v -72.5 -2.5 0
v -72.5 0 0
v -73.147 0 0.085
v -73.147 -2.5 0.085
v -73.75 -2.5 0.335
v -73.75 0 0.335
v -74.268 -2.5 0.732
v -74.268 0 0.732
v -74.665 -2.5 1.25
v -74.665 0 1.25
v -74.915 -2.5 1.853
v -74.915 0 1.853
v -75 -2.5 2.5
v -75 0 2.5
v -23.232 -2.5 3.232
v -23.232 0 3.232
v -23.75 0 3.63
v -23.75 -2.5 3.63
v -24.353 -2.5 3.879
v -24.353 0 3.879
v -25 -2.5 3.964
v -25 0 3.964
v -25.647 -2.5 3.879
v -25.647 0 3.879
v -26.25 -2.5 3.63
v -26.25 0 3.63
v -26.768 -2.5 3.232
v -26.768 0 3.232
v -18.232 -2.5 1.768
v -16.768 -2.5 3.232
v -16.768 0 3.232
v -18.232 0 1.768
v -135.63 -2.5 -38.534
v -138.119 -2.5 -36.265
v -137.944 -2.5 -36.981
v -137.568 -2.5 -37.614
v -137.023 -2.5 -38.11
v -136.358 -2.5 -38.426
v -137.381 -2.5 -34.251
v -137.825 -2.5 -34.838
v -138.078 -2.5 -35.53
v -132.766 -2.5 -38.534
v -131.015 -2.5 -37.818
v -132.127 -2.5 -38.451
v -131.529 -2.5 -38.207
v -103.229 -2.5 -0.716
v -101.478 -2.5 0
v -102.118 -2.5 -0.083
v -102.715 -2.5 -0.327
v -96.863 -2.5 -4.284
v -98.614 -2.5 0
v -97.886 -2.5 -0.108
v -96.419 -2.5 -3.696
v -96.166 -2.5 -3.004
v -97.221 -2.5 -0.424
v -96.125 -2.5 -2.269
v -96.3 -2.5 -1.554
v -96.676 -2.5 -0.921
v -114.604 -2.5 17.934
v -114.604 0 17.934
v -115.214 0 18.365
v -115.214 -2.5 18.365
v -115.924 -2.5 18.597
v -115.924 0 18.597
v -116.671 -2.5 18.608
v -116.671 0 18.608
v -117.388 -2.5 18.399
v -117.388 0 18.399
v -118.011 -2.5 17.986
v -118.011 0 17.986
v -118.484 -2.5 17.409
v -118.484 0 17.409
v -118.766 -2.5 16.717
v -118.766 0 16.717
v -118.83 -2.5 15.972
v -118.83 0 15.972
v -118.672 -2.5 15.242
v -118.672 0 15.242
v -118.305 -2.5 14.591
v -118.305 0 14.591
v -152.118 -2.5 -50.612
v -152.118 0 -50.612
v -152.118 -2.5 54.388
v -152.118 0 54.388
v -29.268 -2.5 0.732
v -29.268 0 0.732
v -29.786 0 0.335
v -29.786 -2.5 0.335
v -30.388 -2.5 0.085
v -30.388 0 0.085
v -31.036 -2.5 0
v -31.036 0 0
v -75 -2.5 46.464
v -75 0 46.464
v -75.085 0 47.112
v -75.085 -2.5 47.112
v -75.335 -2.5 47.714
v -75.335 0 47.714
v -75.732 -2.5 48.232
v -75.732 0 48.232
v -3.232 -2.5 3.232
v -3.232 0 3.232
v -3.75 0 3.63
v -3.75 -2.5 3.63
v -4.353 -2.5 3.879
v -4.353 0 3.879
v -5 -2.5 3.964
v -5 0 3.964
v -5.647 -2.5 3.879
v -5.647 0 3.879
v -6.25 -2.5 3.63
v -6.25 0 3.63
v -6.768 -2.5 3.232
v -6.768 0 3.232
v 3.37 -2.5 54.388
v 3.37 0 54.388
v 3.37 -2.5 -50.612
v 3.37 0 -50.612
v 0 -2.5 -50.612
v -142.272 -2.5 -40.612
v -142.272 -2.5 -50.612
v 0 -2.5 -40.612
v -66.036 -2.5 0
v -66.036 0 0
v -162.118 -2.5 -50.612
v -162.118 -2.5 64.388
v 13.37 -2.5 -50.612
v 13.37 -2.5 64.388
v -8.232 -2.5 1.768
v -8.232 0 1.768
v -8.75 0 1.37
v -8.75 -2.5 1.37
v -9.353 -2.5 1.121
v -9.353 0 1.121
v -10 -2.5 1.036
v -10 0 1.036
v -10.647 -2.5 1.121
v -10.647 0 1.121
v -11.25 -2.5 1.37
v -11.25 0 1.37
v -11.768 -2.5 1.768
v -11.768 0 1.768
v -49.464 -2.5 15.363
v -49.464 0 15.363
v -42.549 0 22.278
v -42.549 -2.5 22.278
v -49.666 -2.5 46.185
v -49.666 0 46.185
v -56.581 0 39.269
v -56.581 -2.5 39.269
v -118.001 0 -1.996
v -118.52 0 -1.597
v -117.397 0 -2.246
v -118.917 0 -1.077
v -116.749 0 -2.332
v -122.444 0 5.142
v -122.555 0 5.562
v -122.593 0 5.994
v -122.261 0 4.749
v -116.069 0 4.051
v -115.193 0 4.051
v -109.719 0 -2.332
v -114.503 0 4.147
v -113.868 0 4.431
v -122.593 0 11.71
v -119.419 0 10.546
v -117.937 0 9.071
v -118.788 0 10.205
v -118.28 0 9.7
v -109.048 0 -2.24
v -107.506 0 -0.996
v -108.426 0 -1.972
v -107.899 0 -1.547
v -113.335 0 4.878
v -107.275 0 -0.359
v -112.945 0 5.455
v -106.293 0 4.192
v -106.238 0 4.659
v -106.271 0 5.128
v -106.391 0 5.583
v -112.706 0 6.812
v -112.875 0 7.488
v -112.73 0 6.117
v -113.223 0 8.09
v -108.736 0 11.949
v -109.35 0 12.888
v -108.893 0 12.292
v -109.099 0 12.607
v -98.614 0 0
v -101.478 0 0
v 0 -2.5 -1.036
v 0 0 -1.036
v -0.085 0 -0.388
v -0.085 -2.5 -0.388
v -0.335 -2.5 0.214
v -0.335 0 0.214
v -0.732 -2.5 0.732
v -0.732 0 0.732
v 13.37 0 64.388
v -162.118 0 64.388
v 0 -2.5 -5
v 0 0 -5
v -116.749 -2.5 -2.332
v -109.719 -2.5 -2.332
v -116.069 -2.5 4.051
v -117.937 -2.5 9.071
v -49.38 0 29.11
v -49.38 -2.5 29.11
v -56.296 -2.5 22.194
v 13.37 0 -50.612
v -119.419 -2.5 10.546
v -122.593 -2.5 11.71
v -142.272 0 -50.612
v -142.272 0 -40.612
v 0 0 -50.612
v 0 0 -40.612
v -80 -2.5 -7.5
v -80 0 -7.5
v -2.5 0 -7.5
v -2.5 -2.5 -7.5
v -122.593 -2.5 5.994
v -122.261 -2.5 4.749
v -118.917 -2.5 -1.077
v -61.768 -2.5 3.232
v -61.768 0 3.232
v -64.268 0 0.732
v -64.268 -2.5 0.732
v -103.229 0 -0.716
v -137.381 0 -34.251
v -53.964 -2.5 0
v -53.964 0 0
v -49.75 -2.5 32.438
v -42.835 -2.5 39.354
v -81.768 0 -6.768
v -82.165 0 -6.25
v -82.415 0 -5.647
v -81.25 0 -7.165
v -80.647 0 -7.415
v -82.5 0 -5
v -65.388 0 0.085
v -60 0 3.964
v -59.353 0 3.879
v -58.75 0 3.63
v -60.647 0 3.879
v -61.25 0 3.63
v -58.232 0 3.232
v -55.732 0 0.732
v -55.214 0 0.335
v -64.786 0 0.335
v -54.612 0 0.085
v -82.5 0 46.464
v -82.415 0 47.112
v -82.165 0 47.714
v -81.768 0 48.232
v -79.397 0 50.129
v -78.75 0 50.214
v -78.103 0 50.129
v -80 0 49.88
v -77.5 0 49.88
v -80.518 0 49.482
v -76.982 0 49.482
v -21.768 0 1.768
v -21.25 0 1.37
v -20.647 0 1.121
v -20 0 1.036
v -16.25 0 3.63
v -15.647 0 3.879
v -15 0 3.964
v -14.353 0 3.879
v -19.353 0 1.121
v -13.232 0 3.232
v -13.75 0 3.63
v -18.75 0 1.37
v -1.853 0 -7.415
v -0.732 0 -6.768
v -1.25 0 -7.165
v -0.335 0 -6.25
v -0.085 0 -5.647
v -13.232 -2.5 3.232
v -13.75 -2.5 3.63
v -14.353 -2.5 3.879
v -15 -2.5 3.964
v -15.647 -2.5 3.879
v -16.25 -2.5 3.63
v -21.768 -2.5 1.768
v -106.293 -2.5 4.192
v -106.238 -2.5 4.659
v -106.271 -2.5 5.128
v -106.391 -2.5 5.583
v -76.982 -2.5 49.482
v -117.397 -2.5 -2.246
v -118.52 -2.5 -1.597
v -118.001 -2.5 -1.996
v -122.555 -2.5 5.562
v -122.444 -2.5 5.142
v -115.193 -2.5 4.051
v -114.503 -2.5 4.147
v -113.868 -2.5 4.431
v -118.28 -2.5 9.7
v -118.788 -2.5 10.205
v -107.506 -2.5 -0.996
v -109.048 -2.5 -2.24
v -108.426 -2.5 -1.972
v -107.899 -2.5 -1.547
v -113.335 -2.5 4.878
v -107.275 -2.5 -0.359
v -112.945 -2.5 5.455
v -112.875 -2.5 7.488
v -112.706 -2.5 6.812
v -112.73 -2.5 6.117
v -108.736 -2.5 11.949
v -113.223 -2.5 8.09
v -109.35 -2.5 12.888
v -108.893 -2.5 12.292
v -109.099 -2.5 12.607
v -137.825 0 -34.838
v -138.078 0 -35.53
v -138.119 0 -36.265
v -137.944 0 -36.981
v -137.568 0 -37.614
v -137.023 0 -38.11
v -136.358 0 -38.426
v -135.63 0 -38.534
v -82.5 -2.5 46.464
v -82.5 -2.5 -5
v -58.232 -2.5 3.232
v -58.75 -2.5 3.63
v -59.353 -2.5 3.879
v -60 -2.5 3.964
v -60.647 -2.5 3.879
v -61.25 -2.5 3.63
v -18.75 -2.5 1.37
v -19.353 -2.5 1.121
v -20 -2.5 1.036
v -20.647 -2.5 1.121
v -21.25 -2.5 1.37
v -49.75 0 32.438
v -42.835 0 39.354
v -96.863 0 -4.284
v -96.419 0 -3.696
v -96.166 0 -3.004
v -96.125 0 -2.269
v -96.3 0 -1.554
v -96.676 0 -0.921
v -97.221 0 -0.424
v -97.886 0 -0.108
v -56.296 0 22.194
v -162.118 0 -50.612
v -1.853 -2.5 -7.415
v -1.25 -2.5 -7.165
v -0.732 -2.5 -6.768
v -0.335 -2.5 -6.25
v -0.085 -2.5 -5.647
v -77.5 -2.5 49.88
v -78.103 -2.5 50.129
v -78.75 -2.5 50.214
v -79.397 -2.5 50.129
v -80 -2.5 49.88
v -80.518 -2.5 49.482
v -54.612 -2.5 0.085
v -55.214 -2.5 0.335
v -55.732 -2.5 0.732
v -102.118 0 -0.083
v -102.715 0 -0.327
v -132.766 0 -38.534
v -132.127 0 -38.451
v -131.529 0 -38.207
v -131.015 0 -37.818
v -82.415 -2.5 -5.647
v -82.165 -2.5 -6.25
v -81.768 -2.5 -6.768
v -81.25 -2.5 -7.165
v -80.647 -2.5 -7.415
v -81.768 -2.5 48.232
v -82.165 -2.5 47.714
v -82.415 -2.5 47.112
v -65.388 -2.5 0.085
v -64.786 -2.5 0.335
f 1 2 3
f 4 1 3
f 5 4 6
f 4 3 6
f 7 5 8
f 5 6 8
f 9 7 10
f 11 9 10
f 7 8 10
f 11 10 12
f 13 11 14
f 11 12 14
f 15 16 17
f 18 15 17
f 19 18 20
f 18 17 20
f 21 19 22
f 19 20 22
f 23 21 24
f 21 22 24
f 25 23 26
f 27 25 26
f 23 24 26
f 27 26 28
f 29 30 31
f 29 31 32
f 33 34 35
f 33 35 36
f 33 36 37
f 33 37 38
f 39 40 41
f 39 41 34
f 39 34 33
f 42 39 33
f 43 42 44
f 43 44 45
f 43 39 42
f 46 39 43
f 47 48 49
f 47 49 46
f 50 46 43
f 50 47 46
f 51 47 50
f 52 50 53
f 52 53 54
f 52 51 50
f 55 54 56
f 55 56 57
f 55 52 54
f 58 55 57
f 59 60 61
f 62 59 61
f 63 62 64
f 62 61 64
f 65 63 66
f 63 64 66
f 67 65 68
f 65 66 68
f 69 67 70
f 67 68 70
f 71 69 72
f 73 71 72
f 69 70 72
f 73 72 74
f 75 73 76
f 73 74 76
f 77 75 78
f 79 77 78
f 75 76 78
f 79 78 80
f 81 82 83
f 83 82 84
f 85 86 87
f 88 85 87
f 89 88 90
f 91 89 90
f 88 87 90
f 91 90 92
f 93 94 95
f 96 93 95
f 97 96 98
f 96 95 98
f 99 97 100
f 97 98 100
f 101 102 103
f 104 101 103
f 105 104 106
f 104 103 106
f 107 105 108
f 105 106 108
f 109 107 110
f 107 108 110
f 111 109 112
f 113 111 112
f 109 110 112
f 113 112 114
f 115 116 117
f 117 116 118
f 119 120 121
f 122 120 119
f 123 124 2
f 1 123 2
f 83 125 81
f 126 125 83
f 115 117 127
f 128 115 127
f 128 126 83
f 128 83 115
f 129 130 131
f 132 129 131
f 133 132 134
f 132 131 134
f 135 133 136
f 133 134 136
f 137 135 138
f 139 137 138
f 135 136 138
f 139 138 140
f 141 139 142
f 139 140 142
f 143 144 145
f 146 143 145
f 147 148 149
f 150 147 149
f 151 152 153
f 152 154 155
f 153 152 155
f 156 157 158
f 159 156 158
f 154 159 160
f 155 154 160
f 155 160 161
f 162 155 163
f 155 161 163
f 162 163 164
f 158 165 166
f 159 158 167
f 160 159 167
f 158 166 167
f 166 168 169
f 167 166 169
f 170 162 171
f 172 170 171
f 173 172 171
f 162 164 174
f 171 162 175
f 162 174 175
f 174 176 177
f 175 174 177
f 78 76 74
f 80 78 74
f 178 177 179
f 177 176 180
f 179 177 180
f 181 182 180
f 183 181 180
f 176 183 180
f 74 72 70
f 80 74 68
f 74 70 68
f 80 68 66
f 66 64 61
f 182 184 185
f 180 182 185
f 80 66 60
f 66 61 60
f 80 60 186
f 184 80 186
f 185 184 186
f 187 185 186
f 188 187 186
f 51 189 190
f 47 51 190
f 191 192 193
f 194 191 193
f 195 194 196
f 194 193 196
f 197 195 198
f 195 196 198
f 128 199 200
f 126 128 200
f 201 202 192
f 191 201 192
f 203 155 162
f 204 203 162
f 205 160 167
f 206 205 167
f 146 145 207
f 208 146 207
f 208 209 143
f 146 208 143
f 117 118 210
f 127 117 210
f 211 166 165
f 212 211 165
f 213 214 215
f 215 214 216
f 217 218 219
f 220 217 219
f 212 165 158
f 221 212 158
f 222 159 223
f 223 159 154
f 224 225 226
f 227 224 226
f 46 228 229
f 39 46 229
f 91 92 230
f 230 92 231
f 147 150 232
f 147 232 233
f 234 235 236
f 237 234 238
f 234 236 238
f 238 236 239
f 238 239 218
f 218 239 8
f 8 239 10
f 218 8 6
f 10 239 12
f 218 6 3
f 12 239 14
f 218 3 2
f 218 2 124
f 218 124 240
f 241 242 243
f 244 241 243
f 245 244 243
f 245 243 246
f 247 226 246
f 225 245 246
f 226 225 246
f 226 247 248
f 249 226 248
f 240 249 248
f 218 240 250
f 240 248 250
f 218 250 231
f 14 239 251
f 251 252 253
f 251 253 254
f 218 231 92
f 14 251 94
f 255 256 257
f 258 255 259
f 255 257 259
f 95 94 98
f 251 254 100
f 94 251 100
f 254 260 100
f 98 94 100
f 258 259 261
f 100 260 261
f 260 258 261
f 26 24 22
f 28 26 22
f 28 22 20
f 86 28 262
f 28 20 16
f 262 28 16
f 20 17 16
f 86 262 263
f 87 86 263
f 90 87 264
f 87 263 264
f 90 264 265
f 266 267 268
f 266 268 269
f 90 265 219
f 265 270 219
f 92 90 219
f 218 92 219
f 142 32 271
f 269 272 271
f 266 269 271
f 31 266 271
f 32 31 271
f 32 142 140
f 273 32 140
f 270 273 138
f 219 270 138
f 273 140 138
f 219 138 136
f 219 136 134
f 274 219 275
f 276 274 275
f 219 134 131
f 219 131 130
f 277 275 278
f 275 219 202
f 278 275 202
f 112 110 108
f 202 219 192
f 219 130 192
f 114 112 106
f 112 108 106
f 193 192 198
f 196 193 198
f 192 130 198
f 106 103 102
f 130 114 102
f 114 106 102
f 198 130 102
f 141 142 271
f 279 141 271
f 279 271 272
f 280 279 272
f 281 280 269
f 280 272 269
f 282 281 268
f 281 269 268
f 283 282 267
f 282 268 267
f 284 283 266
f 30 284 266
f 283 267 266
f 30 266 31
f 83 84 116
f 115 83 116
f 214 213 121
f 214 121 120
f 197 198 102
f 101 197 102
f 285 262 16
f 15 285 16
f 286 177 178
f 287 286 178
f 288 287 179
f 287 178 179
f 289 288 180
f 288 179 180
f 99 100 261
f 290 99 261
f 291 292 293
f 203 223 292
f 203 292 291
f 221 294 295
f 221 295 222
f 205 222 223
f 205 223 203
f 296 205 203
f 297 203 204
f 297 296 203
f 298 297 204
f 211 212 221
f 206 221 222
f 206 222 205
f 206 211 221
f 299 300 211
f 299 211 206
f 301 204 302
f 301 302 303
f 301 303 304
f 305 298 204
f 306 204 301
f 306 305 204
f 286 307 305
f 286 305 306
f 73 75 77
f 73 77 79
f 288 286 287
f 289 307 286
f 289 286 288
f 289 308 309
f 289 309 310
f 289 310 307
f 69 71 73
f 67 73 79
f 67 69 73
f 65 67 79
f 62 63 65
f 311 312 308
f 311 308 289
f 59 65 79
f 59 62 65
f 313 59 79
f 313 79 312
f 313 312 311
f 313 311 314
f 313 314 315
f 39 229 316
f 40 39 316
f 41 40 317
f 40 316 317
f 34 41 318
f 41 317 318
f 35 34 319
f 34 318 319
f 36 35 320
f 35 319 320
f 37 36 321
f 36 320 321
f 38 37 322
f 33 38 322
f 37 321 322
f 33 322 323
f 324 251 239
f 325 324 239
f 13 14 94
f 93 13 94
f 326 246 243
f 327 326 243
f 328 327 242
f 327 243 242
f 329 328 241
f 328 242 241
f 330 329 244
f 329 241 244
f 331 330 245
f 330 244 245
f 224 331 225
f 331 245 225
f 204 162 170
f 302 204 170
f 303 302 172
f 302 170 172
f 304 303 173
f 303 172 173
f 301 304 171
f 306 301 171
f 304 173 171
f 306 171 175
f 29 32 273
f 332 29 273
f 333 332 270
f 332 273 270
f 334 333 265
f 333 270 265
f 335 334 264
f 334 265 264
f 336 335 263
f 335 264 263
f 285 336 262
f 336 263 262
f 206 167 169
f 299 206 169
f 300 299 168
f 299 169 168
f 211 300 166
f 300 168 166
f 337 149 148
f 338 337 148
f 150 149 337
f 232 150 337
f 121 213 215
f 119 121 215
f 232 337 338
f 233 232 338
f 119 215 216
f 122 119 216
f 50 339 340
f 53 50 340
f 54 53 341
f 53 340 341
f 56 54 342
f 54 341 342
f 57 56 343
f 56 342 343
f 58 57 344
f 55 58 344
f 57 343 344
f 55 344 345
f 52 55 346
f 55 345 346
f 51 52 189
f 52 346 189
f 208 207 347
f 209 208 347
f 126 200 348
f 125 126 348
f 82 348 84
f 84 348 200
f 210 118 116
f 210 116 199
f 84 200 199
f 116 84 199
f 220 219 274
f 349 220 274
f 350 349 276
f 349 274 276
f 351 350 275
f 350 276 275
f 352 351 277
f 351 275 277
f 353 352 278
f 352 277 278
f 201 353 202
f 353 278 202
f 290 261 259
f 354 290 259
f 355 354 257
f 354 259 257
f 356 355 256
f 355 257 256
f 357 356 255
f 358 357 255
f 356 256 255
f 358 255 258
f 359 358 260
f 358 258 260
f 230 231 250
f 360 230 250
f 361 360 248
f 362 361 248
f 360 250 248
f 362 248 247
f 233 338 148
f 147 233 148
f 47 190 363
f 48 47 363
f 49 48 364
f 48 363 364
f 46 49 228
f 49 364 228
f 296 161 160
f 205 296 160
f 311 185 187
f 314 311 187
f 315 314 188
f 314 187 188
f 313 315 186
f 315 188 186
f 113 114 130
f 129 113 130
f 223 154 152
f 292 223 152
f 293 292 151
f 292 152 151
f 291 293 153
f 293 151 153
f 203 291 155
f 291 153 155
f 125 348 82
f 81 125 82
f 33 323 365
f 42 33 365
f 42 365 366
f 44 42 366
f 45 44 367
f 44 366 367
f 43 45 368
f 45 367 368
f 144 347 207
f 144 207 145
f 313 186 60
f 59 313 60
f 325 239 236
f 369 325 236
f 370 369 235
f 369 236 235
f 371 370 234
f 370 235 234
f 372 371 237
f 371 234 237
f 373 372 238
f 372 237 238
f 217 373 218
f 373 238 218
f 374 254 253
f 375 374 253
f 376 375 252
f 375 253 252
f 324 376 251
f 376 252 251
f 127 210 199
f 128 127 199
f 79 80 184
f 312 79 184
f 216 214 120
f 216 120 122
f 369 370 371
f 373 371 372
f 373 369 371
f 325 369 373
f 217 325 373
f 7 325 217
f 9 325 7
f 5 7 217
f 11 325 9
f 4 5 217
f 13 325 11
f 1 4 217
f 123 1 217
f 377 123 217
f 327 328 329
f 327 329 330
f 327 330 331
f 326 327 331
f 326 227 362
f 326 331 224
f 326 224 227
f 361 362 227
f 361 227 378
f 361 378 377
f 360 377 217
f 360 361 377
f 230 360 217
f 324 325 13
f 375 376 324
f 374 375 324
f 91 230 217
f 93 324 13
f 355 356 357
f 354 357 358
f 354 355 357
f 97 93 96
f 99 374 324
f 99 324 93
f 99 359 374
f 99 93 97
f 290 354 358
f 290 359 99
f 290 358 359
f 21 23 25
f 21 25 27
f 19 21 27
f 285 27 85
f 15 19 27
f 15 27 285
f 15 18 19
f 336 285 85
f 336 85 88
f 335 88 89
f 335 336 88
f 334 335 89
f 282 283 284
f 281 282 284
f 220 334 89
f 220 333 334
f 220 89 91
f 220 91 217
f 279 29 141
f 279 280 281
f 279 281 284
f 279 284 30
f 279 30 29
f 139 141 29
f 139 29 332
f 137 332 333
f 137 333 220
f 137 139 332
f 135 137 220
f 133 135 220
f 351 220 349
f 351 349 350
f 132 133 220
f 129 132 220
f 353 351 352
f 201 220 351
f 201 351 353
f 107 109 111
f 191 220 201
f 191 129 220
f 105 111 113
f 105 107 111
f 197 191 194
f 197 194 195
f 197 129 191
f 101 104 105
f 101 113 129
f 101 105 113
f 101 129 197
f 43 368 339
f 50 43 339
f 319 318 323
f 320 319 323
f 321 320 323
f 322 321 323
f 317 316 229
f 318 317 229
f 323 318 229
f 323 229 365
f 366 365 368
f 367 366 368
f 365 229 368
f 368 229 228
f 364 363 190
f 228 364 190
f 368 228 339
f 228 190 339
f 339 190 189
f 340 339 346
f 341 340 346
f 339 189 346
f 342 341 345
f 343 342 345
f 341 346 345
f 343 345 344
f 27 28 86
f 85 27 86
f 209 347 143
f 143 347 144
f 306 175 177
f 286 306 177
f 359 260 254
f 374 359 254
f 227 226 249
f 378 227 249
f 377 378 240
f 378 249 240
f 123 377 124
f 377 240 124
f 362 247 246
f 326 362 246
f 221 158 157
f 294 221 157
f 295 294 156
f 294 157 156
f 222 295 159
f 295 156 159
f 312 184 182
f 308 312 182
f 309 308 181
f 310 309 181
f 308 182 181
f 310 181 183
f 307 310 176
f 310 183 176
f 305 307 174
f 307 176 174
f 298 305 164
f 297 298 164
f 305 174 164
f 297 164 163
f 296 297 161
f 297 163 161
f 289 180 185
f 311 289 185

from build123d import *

# Parameters (mm, degrees)
F1_DEPTH = 5
F0_W     = 310.97637631
F0_H     = 20
F0_W_2   = 284.5448851585
F2_SCALE = 0.5


with BuildPart() as f1:
    # F0 (on Front) → F1 (new body)
    with BuildSketch(Plane.XZ):
        with BuildLine():
            Line((0, -10), (0, -2.0710678119))
            ThreePointArc((0, -2.0710678119), (-0.3806023374, -0.15765065), (-1.4644660941, 1.4644660941))
            Line((-1.4644660941, 1.4644660941), (-6.4644660941, 6.4644660941))
            ThreePointArc((-6.4644660941, 6.4644660941), (-10, 7.9289321881), (-13.5355339059, 6.4644660941))
            Line((-13.5355339059, 6.4644660941), (-16.4644660941, 3.5355339059))
            ThreePointArc((-16.4644660941, 3.5355339059), (-20, 2.0710678119), (-23.5355339059, 3.5355339059))
            Line((-23.5355339059, 3.5355339059), (-26.4644660941, 6.4644660941))
            ThreePointArc((-26.4644660941, 6.4644660941), (-30, 7.9289321881), (-33.5355339059, 6.4644660941))
            Line((-33.5355339059, 6.4644660941), (-36.4644660941, 3.5355339059))
            ThreePointArc((-36.4644660941, 3.5355339059), (-40, 2.0710678119), (-43.5355339059, 3.5355339059))
            Line((-43.5355339059, 3.5355339059), (-46.4644660941, 6.4644660941))
            ThreePointArc((-46.4644660941, 6.4644660941), (-50, 7.9289321881), (-53.5355339059, 6.4644660941))
            Line((-53.5355339059, 6.4644660941), (-58.5355339059, 1.4644660941))
            ThreePointArc((-58.5355339059, 1.4644660941), (-60.15765065, 0.3806023374), (-62.0710678119, 0))
            Line((-62.0710678119, 0), (-107.9289321881, 0))
            ThreePointArc((-107.9289321881, 0), (-109.84234935, 0.3806023374), (-111.4644660941, 1.4644660941))
            Line((-111.4644660941, 1.4644660941), (-116.4644660941, 6.4644660941))
            ThreePointArc((-116.4644660941, 6.4644660941), (-120, 7.9289321881), (-123.5355339059, 6.4644660941))
            Line((-123.5355339059, 6.4644660941), (-128.5355339059, 1.4644660941))
            ThreePointArc((-128.5355339059, 1.4644660941), (-130.15765065, 0.3806023374), (-132.0710678119, 0))
            Line((-132.0710678119, 0), (-145, 0))
            ThreePointArc((-145, 0), (-148.5355339059, 1.4644660941), (-150, 5))
            Line((-150, 5), (-150, 92.9289321881))
            ThreePointArc((-150, 92.9289321881), (-150.3806023374, 94.84234935), (-151.4644660941, 96.4644660941))
            Line((-151.4644660941, 96.4644660941), (-153.9644660941, 98.9644660941))
            ThreePointArc((-153.9644660941, 98.9644660941), (-157.5, 100.4289321881), (-161.0355339059, 98.9644660941))
            Line((-161.0355339059, 98.9644660941), (-163.5355339059, 96.4644660941))
            ThreePointArc((-163.5355339059, 96.4644660941), (-164.6193976626, 94.84234935), (-165, 92.9289321881))
            Line((-165, 92.9289321881), (-165, -10))
            ThreePointArc((-165, -10), (-163.5355339059, -13.5355339059), (-160, -15))
            Line((-160, -15), (-5, -15))
            ThreePointArc((-5, -15), (-1.4644660941, -13.5355339059), (0, -10))
        make_face()
    extrude(amount=F1_DEPTH)


with BuildPart() as f1b:
    # F0 (on Front) → F1, piece 2 (new body)
    with BuildSketch(Plane.XZ):
        with BuildLine():
            ThreePointArc((-193.7254233377, -8.5676432473), (-192.6004753719, -3.1076755348), (-197.2285536036, 0))
            Line((-197.2285536036, 0), (-202.9556044966, 0))
            ThreePointArc((-202.9556044966, 0), (-204.8479289618, -0.3719217683), (-206.4587347625, -1.4323567527))
            Line((-206.4587347625, -1.4323567527), (-274.7627281037, -68.501222602))
            ThreePointArc((-274.7627281037, -68.501222602), (-275.8876760695, -73.9611903145), (-271.2595978379, -77.0688658493))
            Line((-271.2595978379, -77.0688658493), (-265.5325469448, -77.0688658493))
            ThreePointArc((-265.5325469448, -77.0688658493), (-263.6402224796, -76.696944081), (-262.029416679, -75.6365090967))
            Line((-262.029416679, -75.6365090967), (-193.7254233377, -8.5676432473))
        make_face()
    extrude(amount=F1_DEPTH)


with BuildPart() as f1c:
    # F0 (on Front) → F1, piece 3 (new body)
    with BuildSketch(Plane.XZ):
        with BuildLine():
            Line((-218.7008427913, 25.7752162691), (-229.2070842299, 35.8678698686))
            ThreePointArc((-229.2070842299, 35.8678698686), (-236.021967756, 35.9729470347), (-236.6101356246, 29.1826792018))
            Line((-236.6101356246, 29.1826792018), (-226.4459441794, 16.1805180131))
            ThreePointArc((-226.4459441794, 16.1805180131), (-225.890873637, 10.9098869907), (-230.3851467959, 8.1011215225))
            Line((-230.3851467959, 8.1011215225), (-232.1372330189, 8.1011215225))
            Line((-232.1372330189, 8.1011215225), (-235.87300241, 18.1410032942))
            ThreePointArc((-235.87300241, 18.1410032942), (-237.0320287136, 19.9412995895), (-238.8378386273, 21.0917165917))
            Line((-238.8378386273, 21.0917165917), (-245.1861649752, 23.4194360673))
            Line((-245.1861649752, 23.4194360673), (-245.1861649752, 11.9873284513))
            ThreePointArc((-245.1861649752, 11.9873284513), (-245.0173826519, 10.6991763796), (-244.5224306712, 9.4979912276))
            Line((-244.5224306712, 9.4979912276), (-237.8336253269, -2.1534784428))
            ThreePointArc((-237.8336253269, -2.1534784428), (-236.0026853464, -3.9911890648), (-233.4973596309, -4.6641412191))
            Line((-233.4973596309, -4.6641412191), (-219.4370961652, -4.6641412191))
            ThreePointArc((-219.4370961652, -4.6641412191), (-216.2963111363, -3.5545742801), (-214.5494905996, -0.7183289799))
            Line((-214.5494905996, -0.7183289799), (-212.5863872862, 8.3833462982))
            ThreePointArc((-212.5863872862, 8.3833462982), (-212.4863357749, 9.7886421375), (-212.7822776415, 11.1660618674))
            Line((-212.7822776415, 11.1660618674), (-217.4729763592, 23.8979499014))
            ThreePointArc((-217.4729763592, 23.8979499014), (-217.9802754518, 24.9063294265), (-218.7008427913, 25.7752162691))
        make_face()
    extrude(amount=F1_DEPTH)


with BuildPart() as f1d:
    # F0 (on Front) → F1, piece 4 (new body)
    with BuildSketch(Plane.XZ):
        Polygon((-85.6691618817, 78.7073502742), (-99.3316528824, 92.3698412749), (-113.1628155708, 78.5386785865), (-99.5003245701, 64.8761875858), align=None)
    extrude(amount=F1_DEPTH)


with BuildPart() as f1e:
    # F0 (on Front) → F1, piece 5 (new body)
    with BuildSketch(Plane.XZ):
        Polygon((-85.0975868729, 44.5565132919), (-98.7600778736, 58.2190042926), (-112.591240562, 44.3878416041), (-98.9287495613, 30.7253506035), align=None)
    extrude(amount=F1_DEPTH)


with BuildPart() as f1f:
    # F0 (on Front) → F1, piece 6 (new body)
    with BuildSketch(Plane.XZ):
        Polygon((-324.2362141609, 128.7761288881), (-324.2362141609, -101.2238711119), (-304.2362141609, -101.2238711119), (-304.2362141609, 108.7761288881), (-304.2362141609, 128.7761288881), align=None)
        with Locations((-148.7480260059, 118.7761288881)):
            Rectangle(F0_W, F0_H)
        Polygon((6.7401621491, 128.7761288881), (6.7401621491, 108.7761288881), (6.7401621491, -101.2238711119), (26.7401621491, -101.2238711119), (26.7401621491, 128.7761288881), align=None)
    extrude(amount=F1_DEPTH)


with BuildPart() as f1g:
    # F0 (on Front) → F1, piece 7 (new body)
    with BuildSketch(Plane.XZ):
        with Locations((-142.2724425793, -91.2238711119)):
            Rectangle(F0_W_2, F0_H)
    extrude(amount=F1_DEPTH)


with BuildPart() as f1f_1:
    # F2: moved
    add(f1f.part.scale(F2_SCALE))


with BuildPart() as f1_1:
    # F2: moved
    add(f1.part.scale(F2_SCALE))


with BuildPart() as f1d_1:
    # F2: moved
    add(f1d.part.scale(F2_SCALE))


with BuildPart() as f1e_1:
    # F2: moved
    add(f1e.part.scale(F2_SCALE))


with BuildPart() as f1c_1:
    # F2: moved
    add(f1c.part.scale(F2_SCALE))


with BuildPart() as f1b_1:
    # F2: moved
    add(f1b.part.scale(F2_SCALE))


with BuildPart() as f1g_1:
    # F2: moved
    add(f1g.part.scale(F2_SCALE))


solid = Compound([f1f_1.part, f1_1.part, f1d_1.part, f1e_1.part, f1c_1.part, f1b_1.part, f1g_1.part])
